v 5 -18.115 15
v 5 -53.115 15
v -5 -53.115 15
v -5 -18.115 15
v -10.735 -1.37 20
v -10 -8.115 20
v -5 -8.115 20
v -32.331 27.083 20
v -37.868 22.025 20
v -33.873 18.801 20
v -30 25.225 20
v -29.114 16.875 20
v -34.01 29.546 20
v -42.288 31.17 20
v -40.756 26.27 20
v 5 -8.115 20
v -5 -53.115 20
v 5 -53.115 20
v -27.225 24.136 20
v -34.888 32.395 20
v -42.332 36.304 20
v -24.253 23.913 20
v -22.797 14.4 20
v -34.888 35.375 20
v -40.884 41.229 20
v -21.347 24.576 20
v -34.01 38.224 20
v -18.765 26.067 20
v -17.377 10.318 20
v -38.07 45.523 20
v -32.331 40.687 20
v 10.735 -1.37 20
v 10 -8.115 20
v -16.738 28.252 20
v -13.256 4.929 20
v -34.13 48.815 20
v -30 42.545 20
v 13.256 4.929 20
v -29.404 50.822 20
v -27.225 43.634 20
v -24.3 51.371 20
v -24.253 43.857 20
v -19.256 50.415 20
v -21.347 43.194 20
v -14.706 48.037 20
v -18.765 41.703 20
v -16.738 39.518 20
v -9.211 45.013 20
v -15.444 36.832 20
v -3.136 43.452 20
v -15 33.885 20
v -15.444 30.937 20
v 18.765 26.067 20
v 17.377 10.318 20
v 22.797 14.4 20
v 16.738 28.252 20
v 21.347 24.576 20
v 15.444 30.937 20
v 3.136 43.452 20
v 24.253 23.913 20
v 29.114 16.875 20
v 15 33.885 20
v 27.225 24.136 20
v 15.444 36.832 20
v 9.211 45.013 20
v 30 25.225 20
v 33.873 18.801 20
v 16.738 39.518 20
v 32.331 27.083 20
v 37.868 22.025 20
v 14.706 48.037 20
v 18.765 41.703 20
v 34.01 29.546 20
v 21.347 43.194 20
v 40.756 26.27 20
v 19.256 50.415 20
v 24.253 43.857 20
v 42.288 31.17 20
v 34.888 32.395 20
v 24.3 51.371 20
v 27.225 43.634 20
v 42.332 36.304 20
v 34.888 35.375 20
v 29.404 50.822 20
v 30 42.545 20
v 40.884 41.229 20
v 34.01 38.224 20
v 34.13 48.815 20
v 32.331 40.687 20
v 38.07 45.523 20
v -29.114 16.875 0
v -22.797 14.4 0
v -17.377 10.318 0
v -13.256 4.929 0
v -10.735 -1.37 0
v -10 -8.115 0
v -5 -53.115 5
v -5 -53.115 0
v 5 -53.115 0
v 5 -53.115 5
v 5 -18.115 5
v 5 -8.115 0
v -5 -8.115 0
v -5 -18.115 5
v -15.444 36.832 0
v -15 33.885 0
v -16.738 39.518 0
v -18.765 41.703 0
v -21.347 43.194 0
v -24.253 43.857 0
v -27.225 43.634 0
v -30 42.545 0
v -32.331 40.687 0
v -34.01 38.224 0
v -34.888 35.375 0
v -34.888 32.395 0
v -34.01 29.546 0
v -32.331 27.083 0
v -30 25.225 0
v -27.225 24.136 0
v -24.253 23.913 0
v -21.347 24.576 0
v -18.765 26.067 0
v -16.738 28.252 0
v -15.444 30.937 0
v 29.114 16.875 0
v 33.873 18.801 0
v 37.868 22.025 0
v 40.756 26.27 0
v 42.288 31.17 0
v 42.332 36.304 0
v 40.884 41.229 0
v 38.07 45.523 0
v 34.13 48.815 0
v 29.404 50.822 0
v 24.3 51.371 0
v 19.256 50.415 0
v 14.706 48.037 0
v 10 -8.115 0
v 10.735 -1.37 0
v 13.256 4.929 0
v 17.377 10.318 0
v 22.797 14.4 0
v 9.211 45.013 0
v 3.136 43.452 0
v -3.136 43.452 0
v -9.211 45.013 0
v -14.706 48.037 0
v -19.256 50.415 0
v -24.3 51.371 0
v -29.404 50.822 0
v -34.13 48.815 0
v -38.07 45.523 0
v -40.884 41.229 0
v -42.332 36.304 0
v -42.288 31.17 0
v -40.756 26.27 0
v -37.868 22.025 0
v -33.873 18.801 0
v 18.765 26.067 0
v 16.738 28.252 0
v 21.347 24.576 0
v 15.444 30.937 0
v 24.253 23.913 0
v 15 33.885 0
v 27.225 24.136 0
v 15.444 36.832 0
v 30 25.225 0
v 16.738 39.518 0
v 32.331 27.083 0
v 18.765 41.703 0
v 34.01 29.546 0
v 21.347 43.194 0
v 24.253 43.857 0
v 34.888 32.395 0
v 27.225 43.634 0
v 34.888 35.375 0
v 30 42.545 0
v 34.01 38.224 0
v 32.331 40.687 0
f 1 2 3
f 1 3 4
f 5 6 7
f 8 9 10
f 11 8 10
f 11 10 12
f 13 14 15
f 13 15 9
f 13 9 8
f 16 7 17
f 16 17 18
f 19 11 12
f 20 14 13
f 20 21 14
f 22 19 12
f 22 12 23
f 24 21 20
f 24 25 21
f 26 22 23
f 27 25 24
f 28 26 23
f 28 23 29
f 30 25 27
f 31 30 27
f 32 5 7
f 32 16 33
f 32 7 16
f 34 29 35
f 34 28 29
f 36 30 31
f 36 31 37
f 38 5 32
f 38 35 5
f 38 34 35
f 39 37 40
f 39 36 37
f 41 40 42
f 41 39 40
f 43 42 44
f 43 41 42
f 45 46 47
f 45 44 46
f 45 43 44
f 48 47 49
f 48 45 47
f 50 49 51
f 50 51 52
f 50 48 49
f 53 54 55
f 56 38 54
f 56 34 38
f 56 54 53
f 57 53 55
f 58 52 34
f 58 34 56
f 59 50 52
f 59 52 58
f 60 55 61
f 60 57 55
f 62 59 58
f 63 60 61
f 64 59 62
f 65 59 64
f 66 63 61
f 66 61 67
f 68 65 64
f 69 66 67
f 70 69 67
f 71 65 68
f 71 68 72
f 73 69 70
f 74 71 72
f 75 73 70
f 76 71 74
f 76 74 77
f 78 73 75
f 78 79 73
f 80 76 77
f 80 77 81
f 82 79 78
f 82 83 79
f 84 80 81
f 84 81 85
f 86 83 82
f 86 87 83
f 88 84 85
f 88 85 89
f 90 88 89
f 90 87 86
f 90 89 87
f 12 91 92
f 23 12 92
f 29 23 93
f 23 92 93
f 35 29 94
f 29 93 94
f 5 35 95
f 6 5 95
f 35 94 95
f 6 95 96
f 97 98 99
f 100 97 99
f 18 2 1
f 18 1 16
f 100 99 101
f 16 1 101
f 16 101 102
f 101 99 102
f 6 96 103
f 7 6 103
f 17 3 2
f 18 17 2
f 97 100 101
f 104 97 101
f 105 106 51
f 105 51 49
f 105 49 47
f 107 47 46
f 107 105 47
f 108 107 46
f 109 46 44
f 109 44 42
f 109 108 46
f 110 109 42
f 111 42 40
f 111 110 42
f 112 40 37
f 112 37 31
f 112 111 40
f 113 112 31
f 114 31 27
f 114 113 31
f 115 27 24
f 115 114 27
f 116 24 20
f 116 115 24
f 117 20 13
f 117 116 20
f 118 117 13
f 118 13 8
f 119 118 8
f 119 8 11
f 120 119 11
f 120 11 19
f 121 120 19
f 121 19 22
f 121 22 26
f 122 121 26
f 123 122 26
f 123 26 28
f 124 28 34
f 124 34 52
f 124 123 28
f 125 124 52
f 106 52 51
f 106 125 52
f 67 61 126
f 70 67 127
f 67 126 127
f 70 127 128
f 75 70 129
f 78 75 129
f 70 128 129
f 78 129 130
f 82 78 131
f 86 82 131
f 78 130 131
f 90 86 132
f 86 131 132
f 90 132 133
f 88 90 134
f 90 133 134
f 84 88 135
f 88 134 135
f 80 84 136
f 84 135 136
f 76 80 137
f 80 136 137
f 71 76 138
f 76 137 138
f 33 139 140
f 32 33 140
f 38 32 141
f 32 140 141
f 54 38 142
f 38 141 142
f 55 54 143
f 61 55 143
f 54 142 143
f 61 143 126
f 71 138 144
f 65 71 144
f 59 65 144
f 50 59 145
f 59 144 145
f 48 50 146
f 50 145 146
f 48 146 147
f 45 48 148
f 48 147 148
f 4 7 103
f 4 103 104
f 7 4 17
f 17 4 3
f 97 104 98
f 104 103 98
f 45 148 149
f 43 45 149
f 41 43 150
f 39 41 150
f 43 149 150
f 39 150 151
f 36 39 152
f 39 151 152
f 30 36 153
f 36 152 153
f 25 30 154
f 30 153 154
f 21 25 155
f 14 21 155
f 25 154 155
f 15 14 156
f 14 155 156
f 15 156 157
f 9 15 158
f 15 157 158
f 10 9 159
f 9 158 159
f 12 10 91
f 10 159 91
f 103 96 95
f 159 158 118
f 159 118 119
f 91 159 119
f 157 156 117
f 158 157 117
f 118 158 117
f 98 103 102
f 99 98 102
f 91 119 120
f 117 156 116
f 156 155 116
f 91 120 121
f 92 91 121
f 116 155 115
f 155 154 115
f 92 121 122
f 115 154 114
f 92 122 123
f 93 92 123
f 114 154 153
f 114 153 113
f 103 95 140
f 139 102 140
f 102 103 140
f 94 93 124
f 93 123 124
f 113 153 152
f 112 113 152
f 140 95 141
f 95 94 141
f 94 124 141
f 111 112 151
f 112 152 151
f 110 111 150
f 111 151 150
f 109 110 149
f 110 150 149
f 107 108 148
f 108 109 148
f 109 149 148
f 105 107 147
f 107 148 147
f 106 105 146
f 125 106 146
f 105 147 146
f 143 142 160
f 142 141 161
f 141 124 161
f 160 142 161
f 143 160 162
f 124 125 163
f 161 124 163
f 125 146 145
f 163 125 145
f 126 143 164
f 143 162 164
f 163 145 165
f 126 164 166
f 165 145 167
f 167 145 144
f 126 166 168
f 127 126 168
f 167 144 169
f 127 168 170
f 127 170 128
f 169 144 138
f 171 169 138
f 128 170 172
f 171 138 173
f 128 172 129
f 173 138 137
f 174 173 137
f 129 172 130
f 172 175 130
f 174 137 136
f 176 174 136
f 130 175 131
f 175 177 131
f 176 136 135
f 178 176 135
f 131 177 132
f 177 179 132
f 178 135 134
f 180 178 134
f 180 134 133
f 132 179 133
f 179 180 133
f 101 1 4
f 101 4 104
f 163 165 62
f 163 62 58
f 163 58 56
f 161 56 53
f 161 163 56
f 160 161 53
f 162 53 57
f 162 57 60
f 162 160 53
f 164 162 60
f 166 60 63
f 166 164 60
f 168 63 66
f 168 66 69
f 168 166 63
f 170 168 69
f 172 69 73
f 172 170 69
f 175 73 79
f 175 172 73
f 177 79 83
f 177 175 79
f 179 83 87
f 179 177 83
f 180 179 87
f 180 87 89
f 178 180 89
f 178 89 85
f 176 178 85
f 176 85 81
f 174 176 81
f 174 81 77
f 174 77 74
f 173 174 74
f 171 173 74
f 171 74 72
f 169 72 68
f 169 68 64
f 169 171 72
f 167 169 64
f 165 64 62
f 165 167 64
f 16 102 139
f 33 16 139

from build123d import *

# Parameters (mm, degrees)
IZIM1_R                     = 10
Y_KSEKLIK_EKSTR_ZYON1_DEPTH = 20
IZIM3_W                     = 10
IZIM3_H                     = 35
KES_EKSTR_ZYON1_DEPTH       = 10


with BuildPart() as part:
    # Çizim1 → Yükseklik-Ekstrüzyon1 (new body)
    with BuildSketch(Plane.XY):
        with BuildLine():
            Line((-10, -8.115065243), (-5, -8.115065243))
            Line((-5, -8.115065243), (-5, -53.115065243))
            Line((-5, -53.115065243), (5, -53.115065243))
            Line((5, -53.115065243), (5, -8.115065243))
            Line((5, -8.115065243), (10, -8.115065243))
            ThreePointArc((10, -8.115065243), (15.132819854, 7.763816786), (29.113715132, 16.875309605))
            ThreePointArc((29.113715132, 16.875309605), (40.884337762, 41.229171535), (14.705882353, 48.037006756))
            ThreePointArc((14.705882353, 48.037006756), (0, 43.254252469), (-14.705882353, 48.037006756))
            ThreePointArc((-14.705882353, 48.037006756), (-40.884337762, 41.229171535), (-29.113715132, 16.875309605))
            ThreePointArc((-29.113715132, 16.875309605), (-15.132819854, 7.763816786), (-10, -8.115065243))
        make_face()
        with Locations((-25, 33.884934757)):
            Circle(IZIM1_R, mode=Mode.SUBTRACT)
        with Locations(Location((25, 33.884934757, 0), (0, 0, 180))):
            Circle(IZIM1_R, mode=Mode.SUBTRACT)
    extrude(amount=Y_KSEKLIK_EKSTR_ZYON1_DEPTH)

    # Çizim3 → Kes-Ekstrüzyon1 (cut)
    with BuildSketch(Plane(origin=(5, 0, 0), x_dir=(0, 0, -1), z_dir=(1, 0, 0))):
        with Locations((-10, -35.615065243)):
            Rectangle(IZIM3_W, IZIM3_H)
    extrude(amount=-KES_EKSTR_ZYON1_DEPTH, mode=Mode.SUBTRACT)


solid = part.part
